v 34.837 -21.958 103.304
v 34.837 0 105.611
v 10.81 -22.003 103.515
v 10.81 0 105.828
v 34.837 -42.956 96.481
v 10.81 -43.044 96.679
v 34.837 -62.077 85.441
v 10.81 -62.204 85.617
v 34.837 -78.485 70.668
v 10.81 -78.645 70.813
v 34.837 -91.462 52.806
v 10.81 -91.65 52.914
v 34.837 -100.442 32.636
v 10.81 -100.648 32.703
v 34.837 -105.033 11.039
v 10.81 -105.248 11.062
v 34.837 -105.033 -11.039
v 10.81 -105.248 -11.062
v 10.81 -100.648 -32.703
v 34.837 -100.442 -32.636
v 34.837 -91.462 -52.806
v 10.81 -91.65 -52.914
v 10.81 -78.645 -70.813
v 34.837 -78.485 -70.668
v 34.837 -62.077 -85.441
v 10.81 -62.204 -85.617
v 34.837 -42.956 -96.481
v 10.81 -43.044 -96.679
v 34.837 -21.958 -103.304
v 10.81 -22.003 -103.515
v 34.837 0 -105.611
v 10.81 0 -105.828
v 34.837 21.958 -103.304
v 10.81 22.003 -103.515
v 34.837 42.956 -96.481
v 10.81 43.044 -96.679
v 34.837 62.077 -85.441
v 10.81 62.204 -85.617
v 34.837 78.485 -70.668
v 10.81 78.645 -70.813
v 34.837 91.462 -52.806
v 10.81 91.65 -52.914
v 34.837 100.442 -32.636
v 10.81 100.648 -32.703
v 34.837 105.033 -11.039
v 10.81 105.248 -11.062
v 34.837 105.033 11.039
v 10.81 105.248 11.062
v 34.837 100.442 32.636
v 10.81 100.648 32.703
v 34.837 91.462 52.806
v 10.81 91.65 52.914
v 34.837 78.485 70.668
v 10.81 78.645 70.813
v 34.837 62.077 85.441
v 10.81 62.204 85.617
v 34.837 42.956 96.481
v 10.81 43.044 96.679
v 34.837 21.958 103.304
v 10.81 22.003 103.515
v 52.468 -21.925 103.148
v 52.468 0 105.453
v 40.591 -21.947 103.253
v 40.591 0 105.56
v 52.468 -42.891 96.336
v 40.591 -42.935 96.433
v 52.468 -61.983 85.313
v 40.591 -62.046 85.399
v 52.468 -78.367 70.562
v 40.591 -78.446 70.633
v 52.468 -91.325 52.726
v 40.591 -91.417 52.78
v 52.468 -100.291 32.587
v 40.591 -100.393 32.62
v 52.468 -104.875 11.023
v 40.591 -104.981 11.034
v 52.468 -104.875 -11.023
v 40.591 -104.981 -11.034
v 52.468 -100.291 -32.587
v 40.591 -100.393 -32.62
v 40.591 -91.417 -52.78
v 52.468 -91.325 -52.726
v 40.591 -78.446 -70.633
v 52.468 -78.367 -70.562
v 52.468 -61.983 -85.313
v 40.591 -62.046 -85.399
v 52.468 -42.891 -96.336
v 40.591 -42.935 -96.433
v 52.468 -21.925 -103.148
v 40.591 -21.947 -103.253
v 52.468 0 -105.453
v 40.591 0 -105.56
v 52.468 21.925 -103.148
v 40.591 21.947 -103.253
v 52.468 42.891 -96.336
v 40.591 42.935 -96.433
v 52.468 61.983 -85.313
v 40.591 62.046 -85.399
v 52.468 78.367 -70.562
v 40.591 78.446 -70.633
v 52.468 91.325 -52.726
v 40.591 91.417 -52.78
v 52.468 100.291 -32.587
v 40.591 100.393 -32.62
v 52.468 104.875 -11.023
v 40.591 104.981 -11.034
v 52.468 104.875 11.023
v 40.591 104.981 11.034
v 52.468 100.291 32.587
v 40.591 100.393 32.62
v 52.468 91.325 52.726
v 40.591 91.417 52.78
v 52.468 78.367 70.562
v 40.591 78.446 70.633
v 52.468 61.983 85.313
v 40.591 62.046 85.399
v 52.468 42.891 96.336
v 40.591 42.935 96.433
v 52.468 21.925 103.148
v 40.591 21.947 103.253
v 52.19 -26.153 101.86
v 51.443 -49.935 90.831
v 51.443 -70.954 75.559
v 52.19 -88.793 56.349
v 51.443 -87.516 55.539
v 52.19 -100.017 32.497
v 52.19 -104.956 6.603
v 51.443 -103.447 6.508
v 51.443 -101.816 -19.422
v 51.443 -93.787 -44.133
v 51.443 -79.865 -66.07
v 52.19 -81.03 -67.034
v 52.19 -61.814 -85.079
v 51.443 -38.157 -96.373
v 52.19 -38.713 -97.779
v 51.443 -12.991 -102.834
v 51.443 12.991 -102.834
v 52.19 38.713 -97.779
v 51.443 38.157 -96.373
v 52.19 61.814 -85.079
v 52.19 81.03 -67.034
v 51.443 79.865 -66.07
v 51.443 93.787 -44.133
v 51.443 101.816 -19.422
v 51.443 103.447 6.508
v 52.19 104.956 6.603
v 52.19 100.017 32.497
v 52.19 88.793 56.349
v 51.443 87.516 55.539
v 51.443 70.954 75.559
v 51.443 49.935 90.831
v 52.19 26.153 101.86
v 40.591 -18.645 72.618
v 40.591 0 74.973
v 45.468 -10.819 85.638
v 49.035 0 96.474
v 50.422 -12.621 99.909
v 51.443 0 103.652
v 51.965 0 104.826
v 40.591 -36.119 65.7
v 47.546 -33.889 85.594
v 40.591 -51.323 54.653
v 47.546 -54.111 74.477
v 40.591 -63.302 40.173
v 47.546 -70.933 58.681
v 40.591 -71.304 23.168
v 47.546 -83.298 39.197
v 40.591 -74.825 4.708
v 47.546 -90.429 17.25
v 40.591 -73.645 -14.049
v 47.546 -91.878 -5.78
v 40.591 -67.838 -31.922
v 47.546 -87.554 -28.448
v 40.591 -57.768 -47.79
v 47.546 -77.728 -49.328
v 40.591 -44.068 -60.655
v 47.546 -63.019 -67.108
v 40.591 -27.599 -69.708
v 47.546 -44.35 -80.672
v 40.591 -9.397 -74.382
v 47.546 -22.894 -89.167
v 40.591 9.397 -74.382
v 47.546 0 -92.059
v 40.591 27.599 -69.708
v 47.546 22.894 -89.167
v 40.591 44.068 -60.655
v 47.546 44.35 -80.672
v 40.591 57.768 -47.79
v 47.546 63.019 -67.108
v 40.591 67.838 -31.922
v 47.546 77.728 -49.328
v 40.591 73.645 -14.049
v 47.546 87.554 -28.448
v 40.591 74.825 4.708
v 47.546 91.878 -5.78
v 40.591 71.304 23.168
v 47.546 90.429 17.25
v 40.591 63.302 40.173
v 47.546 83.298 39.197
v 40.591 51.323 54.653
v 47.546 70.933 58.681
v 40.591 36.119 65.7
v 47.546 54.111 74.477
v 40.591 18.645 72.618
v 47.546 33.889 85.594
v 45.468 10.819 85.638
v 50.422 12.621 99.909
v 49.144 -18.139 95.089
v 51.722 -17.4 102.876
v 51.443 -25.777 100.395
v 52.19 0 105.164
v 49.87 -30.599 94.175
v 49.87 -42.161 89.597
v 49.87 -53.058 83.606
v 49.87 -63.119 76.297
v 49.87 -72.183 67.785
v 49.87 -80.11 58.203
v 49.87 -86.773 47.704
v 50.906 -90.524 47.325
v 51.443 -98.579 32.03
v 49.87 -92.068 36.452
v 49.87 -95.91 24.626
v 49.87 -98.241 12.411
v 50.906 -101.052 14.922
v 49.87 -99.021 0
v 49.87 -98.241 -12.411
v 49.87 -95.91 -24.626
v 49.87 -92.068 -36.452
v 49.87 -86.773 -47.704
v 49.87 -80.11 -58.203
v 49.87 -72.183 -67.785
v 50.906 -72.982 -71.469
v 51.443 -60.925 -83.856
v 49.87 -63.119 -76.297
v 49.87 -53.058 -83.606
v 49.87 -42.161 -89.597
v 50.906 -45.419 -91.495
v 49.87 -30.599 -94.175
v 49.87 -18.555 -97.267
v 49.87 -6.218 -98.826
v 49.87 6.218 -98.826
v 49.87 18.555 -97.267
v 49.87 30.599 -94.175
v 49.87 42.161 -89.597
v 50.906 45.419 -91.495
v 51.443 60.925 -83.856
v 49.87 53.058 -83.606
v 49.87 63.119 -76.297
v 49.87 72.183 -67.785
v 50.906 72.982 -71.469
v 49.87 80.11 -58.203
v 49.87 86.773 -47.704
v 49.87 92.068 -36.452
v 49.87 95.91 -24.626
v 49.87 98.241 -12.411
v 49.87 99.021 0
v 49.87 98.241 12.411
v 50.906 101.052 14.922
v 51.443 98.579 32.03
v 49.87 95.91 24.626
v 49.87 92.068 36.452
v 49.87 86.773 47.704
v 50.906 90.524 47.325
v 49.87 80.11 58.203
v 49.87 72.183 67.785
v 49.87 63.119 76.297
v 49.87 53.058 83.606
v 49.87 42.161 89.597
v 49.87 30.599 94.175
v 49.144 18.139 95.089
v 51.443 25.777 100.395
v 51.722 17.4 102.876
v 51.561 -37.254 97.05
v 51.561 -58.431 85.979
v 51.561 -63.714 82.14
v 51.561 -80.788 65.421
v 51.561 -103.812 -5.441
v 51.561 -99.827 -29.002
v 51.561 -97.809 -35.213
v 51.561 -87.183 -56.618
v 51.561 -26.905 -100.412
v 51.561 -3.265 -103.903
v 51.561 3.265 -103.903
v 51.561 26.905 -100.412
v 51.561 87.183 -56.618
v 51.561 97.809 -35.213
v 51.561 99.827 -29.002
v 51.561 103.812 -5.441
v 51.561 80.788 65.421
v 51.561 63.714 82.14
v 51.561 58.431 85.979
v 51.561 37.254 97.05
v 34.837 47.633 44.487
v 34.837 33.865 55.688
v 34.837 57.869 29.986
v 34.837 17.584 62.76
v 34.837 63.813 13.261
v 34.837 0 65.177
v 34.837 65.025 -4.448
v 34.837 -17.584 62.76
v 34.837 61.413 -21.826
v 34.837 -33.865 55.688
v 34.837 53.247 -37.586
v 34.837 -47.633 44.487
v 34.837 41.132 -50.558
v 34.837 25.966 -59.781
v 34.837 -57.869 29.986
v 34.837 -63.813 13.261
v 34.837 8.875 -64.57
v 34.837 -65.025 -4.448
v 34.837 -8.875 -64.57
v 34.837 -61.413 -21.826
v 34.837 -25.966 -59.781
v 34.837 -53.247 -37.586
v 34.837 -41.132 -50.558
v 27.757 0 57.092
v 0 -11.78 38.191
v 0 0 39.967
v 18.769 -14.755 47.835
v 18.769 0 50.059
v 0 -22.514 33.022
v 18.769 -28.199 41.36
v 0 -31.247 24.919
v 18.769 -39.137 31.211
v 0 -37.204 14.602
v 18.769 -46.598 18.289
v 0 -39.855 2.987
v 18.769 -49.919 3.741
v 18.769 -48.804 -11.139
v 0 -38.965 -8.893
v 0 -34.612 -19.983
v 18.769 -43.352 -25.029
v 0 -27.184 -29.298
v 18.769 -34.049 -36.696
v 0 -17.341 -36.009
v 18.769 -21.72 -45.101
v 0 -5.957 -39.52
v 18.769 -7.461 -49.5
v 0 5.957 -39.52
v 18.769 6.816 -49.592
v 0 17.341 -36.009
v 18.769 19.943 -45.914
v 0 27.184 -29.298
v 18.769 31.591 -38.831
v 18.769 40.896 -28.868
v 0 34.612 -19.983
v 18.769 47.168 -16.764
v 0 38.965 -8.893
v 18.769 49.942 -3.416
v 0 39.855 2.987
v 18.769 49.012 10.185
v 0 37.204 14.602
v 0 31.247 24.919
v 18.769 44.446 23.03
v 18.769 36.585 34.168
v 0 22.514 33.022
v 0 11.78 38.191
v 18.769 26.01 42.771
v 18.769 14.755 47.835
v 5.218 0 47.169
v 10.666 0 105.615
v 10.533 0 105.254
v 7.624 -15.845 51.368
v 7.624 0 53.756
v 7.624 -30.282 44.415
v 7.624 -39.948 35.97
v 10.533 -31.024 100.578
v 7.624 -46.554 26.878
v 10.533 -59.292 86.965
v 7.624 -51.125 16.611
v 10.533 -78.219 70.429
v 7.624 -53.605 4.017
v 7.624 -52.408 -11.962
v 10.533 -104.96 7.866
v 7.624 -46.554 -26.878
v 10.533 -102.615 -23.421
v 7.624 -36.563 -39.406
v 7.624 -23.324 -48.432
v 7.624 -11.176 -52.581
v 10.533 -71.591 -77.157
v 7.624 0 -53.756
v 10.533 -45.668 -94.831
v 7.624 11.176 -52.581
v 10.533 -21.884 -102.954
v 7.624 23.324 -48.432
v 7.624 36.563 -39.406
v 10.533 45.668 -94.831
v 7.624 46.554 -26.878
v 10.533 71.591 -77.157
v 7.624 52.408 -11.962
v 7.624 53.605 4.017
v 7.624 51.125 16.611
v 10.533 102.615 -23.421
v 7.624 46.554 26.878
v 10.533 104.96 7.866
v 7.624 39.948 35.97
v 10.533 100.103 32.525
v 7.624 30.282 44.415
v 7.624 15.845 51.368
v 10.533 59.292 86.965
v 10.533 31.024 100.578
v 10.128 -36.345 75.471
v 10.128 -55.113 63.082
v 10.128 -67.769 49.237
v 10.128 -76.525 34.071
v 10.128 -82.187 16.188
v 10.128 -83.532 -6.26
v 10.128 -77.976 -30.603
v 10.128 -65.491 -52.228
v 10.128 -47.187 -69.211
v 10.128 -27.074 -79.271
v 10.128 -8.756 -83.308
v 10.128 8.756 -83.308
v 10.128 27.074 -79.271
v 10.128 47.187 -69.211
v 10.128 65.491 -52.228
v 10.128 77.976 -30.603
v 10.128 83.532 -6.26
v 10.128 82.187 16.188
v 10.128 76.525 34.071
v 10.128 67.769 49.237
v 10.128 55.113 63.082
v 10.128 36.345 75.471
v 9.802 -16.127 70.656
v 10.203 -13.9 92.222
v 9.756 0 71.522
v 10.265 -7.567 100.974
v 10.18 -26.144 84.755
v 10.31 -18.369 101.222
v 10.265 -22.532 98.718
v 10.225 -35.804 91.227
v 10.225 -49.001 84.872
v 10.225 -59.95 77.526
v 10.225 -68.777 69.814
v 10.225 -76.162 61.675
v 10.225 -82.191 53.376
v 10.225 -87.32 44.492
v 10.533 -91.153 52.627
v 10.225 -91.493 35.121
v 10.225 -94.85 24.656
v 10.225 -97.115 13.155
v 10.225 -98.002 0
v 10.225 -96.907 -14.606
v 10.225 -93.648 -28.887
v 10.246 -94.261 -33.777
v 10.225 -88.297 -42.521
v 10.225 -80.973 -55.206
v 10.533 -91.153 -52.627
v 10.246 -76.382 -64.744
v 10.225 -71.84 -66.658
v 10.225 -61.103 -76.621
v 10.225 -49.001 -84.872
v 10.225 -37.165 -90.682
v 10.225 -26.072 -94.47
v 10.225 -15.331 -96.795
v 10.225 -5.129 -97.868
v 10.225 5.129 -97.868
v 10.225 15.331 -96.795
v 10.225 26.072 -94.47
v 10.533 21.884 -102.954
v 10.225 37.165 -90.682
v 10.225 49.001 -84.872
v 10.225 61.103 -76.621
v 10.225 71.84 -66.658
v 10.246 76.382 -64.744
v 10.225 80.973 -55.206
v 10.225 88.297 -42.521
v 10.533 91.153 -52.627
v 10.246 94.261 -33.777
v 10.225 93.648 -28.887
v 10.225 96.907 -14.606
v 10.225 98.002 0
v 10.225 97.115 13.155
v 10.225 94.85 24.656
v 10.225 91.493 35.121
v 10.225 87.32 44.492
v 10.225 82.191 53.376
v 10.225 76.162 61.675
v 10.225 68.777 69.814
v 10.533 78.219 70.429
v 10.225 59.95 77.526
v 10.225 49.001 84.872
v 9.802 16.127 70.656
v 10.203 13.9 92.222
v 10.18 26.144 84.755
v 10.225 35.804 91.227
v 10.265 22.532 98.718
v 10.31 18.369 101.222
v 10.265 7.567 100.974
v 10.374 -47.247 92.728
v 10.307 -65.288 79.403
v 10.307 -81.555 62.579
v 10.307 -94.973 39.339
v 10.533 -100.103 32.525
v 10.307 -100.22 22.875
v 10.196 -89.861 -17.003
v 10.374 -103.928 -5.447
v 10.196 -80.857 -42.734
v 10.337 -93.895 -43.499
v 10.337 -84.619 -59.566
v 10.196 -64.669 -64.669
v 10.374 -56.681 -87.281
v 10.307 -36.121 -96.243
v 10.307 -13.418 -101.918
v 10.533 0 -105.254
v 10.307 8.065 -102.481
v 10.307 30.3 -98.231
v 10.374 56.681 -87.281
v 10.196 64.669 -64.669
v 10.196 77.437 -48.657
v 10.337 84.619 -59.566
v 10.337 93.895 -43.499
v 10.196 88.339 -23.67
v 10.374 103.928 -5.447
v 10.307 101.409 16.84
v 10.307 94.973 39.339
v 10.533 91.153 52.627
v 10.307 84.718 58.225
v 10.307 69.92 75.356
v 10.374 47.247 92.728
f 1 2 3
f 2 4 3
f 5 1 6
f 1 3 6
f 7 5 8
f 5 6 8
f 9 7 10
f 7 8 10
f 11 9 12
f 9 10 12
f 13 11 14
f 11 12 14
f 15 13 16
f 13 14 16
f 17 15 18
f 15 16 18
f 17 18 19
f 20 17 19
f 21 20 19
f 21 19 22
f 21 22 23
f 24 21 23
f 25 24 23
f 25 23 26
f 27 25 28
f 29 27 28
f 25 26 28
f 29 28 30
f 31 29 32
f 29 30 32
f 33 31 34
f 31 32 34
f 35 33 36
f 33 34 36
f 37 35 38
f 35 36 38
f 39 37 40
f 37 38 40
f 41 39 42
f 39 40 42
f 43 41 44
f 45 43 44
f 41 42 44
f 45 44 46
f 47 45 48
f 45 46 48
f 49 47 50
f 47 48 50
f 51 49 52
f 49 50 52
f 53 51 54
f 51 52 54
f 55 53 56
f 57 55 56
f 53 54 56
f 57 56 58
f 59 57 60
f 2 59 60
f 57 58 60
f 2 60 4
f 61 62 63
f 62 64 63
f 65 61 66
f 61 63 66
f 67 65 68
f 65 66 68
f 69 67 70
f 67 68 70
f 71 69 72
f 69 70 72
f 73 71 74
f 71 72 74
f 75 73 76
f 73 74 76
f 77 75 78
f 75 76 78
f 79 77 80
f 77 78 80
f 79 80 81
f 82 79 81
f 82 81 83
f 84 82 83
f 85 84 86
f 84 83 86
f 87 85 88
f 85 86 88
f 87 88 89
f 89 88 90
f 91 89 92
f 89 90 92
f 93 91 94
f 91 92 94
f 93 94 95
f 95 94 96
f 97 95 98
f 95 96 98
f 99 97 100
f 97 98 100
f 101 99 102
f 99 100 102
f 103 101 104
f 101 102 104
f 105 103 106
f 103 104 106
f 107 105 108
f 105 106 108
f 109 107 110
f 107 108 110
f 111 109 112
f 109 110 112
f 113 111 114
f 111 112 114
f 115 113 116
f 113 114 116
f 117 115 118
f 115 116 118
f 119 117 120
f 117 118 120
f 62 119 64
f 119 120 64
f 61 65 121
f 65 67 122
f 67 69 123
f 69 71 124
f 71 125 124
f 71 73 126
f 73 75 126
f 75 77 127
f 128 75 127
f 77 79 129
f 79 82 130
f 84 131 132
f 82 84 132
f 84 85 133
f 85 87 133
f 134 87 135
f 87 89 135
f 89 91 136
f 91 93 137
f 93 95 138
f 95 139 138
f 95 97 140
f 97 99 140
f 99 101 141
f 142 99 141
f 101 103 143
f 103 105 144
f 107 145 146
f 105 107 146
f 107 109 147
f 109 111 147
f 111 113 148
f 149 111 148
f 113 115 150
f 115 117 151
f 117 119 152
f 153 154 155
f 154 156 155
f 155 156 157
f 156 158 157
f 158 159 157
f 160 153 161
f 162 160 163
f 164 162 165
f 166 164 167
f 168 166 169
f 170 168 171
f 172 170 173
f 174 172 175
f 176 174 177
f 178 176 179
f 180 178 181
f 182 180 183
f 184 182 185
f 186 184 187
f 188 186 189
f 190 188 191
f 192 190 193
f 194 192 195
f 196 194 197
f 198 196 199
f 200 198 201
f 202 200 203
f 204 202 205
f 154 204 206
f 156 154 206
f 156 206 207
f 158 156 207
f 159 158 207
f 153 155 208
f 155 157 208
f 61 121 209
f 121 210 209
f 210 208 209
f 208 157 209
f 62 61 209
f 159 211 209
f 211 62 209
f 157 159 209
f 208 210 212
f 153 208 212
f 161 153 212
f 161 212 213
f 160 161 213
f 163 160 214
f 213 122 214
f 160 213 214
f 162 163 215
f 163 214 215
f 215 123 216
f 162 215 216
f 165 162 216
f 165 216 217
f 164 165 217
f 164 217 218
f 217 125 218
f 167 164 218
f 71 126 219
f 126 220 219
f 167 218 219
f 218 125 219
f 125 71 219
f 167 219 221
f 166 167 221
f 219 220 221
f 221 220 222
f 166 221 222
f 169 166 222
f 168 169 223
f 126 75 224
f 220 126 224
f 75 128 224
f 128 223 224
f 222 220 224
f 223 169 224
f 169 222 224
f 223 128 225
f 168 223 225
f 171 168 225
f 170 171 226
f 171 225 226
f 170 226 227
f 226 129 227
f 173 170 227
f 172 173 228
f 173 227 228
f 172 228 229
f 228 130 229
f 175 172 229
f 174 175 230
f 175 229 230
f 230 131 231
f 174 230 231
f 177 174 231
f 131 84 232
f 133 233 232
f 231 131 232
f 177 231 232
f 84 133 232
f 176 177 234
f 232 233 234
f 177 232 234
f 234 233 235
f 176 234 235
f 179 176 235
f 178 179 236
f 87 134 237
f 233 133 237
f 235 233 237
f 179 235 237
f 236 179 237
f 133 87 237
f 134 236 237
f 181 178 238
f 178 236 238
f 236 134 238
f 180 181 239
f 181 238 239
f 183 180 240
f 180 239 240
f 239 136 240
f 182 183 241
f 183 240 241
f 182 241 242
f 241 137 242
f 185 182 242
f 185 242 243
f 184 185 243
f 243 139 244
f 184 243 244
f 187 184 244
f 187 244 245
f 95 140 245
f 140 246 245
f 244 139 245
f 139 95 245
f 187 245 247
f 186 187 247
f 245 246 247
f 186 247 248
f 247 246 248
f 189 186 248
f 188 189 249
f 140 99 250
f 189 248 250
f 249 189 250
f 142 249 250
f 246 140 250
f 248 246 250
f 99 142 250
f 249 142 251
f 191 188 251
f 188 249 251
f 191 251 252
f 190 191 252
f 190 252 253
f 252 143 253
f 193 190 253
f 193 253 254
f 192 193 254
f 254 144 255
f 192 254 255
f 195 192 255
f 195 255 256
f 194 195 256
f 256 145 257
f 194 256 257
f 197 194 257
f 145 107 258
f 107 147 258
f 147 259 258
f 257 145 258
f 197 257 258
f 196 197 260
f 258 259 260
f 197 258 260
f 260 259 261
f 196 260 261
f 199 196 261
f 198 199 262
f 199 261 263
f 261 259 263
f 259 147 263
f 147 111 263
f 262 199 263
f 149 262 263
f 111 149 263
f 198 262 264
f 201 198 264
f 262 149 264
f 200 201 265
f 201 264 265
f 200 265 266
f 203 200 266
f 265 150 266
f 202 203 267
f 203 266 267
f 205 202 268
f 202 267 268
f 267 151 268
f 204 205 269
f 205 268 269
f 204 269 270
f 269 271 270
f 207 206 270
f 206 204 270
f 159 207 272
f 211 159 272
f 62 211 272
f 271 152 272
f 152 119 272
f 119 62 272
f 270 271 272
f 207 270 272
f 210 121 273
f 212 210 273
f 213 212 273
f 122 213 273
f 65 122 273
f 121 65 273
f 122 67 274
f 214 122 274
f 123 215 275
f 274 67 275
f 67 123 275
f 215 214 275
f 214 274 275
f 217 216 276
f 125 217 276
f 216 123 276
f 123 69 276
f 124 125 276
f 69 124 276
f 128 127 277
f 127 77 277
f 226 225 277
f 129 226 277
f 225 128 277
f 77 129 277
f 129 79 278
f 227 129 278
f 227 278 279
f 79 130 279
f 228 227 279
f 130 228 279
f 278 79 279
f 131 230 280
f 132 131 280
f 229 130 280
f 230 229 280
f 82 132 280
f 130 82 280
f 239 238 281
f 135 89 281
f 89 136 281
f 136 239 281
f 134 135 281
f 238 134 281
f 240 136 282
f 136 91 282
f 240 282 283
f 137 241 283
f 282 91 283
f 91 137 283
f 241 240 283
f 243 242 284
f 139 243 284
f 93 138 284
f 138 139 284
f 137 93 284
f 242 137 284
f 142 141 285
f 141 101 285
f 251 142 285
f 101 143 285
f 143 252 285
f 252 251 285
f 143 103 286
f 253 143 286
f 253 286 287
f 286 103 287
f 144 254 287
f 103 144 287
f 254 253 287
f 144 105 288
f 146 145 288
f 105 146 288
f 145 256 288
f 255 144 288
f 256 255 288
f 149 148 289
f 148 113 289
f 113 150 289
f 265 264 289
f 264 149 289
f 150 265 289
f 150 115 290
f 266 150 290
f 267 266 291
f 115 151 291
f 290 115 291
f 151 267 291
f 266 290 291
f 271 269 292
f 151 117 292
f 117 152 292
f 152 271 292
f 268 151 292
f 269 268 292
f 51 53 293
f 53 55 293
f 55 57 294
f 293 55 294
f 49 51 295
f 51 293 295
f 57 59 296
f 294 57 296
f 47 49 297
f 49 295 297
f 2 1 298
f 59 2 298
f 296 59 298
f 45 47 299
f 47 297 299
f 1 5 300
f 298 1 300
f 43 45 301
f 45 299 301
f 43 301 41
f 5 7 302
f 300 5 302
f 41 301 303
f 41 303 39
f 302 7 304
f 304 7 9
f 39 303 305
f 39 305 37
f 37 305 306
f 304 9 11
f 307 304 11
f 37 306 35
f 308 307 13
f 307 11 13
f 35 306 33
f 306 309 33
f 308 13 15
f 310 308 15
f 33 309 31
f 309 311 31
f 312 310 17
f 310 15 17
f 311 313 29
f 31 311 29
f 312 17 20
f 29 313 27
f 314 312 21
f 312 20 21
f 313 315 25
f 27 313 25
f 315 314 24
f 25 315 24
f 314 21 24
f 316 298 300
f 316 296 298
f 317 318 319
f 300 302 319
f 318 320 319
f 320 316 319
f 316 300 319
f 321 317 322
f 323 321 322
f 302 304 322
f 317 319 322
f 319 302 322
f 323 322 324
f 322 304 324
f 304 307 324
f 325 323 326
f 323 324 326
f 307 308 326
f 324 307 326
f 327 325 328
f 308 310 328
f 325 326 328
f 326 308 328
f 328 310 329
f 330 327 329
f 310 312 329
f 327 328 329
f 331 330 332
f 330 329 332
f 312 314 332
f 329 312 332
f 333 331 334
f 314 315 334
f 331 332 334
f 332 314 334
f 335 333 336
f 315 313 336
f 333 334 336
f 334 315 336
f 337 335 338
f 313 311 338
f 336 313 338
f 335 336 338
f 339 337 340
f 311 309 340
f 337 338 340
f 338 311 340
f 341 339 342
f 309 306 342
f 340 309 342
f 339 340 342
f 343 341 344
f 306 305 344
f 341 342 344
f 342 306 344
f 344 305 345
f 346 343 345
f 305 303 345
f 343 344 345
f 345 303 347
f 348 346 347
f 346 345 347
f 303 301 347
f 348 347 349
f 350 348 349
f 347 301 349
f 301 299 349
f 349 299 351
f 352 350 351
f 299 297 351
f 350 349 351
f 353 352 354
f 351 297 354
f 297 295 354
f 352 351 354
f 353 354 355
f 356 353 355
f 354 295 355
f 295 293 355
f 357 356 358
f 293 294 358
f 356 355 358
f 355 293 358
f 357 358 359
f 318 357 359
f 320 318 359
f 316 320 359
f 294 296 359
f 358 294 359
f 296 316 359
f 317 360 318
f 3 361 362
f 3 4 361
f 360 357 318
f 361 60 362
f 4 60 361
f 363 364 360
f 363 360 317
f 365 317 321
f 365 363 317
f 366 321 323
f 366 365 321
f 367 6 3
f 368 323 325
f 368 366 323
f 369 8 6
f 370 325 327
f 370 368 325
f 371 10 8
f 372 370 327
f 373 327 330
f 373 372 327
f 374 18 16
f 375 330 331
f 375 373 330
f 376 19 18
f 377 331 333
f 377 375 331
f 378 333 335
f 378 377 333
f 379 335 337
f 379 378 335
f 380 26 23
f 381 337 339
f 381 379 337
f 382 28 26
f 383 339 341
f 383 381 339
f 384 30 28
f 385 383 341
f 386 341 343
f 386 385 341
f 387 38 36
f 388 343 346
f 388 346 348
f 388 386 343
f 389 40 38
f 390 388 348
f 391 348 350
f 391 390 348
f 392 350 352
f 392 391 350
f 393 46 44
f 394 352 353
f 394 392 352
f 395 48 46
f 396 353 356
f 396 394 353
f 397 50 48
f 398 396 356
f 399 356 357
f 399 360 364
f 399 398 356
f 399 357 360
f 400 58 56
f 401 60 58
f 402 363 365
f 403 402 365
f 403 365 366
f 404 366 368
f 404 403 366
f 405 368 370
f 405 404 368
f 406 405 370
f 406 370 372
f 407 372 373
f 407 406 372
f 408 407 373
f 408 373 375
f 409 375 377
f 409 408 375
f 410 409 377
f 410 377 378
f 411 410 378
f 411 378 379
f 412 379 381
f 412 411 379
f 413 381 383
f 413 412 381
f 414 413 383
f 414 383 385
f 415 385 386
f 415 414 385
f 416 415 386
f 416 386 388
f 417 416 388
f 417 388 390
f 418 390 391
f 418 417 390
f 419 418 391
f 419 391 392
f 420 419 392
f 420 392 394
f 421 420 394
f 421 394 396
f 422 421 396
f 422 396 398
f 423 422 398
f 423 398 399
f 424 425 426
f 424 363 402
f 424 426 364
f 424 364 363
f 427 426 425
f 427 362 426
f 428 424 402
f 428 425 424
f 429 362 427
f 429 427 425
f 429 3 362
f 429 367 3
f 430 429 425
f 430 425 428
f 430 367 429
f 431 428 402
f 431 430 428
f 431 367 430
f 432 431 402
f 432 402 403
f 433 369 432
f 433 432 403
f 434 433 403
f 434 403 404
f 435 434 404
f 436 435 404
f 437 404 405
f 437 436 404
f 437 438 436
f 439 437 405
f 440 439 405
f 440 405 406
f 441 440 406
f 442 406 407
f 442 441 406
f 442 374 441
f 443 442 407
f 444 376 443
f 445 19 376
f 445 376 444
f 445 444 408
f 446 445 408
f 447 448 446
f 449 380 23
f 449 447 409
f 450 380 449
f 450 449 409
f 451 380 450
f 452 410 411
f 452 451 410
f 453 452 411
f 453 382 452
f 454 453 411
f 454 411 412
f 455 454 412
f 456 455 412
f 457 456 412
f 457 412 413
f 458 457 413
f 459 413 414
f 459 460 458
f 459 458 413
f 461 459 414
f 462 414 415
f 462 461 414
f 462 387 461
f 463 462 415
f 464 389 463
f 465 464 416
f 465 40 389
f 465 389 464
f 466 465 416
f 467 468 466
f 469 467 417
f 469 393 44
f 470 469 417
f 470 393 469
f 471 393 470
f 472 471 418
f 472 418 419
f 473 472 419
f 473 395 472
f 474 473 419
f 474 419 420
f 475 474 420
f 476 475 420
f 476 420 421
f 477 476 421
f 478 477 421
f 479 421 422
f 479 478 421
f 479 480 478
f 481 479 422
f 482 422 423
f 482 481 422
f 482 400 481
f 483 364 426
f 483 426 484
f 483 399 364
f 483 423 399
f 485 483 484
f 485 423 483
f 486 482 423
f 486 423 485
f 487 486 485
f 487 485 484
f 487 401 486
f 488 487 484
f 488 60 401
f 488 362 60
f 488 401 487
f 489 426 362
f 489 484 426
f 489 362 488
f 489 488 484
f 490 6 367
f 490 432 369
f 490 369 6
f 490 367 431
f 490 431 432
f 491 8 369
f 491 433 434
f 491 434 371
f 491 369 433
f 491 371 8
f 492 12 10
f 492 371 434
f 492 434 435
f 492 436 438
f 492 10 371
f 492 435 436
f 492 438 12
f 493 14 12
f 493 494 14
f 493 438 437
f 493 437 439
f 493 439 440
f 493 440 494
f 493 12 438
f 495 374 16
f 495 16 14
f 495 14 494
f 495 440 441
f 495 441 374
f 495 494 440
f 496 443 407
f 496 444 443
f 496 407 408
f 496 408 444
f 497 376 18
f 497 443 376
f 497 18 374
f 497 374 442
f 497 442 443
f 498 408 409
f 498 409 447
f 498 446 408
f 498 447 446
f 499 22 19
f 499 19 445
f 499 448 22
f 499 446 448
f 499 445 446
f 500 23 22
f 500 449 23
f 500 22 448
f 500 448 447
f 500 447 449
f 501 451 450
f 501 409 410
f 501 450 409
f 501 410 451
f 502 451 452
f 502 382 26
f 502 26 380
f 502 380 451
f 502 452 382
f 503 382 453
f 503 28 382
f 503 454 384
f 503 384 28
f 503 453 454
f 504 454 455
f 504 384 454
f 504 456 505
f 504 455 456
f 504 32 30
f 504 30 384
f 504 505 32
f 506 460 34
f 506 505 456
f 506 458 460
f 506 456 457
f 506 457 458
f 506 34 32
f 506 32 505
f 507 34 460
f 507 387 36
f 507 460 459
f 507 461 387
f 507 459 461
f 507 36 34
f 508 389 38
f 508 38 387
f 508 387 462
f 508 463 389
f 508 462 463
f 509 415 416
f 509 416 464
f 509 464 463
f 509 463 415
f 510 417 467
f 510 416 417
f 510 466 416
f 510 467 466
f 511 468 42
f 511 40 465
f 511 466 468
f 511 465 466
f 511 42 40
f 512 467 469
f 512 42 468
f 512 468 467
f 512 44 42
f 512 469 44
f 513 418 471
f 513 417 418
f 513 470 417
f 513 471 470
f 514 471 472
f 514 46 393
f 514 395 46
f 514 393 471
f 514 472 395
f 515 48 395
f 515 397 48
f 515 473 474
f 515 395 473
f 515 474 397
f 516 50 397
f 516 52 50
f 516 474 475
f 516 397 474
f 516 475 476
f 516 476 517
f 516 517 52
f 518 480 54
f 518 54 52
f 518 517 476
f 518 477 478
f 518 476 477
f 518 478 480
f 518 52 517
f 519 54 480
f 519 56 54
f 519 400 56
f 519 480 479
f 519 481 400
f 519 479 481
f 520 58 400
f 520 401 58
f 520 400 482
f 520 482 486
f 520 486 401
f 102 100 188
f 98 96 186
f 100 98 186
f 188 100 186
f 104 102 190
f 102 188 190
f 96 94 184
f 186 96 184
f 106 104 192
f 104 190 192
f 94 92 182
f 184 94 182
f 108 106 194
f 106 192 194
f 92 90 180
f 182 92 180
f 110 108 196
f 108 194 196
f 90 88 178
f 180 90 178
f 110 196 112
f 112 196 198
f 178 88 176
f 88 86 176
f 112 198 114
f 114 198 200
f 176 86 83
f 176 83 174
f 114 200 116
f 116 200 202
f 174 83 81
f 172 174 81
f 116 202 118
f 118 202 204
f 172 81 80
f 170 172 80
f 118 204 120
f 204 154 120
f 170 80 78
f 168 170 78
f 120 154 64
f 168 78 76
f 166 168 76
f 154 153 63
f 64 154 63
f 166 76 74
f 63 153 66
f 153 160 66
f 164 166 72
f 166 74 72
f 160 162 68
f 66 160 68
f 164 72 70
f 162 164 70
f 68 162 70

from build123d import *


with BuildPart() as f1:
    # F0 (on Front) → F1 (revolve)
    with BuildSketch(Plane.XZ):
        with BuildLine():
            add(Edge.make_bspline(
                [(0, 39.9668887258), (3.2281963617, 43.6274968822), (11.7154557843, 53.2516112749), (9.6378120579, 104.3193382547), (10.6701239788, 105.648029349), (10.8098071069, 105.8278158307)],
                knots=[0, 0, 0, 0, 0.3467366807, 0.9116063061, 1, 1, 1, 1], degree=3))
            add(Edge.make_bspline(
                [(0, 39.9668887258), (12.812980549, 46.1363323304), (25.625961098, 52.3057759351), (34.8370088305, 65.1767049925)],
                knots=[0, 0, 0, 0, 0.4517491272, 0.4517491272, 0.4517491272, 0.4517491272], degree=3))
            Line((34.8370088305, 65.1767049925), (34.8370088305, 105.6113669327))
            Line((34.8370088305, 105.6113669327), (10.8098071069, 105.8278158307))
        make_face()
    revolve(axis=Axis((37.9028692842, 0, 0), (1, 0, 0)))


with BuildPart() as f1b:
    # F0 (on Front) → F1, piece 2 (revolve)
    with BuildSketch(Plane.XZ):
        with BuildLine():
            Line((40.5912317444, 105.5595300513), (40.5912317444, 74.9732504654))
            add(Edge.make_bspline(
                [(40.5912317444, 74.9732504654), (46.6228561766, 87.2037272928), (51.0962867375, 104.1883923905), (52.255172043, 105.2563369528), (52.4680800736, 105.4525375366)],
                knots=[0.5554017202, 0.5554017202, 0.5554017202, 0.5554017202, 0.9183193162, 1, 1, 1, 1], degree=3))
            Line((52.4680800736, 105.4525375366), (40.5912317444, 105.5595300513))
        make_face()
    revolve(axis=Axis((37.9028692842, 0, 0), (1, 0, 0)))


solid = Compound([f1.part, f1b.part])
